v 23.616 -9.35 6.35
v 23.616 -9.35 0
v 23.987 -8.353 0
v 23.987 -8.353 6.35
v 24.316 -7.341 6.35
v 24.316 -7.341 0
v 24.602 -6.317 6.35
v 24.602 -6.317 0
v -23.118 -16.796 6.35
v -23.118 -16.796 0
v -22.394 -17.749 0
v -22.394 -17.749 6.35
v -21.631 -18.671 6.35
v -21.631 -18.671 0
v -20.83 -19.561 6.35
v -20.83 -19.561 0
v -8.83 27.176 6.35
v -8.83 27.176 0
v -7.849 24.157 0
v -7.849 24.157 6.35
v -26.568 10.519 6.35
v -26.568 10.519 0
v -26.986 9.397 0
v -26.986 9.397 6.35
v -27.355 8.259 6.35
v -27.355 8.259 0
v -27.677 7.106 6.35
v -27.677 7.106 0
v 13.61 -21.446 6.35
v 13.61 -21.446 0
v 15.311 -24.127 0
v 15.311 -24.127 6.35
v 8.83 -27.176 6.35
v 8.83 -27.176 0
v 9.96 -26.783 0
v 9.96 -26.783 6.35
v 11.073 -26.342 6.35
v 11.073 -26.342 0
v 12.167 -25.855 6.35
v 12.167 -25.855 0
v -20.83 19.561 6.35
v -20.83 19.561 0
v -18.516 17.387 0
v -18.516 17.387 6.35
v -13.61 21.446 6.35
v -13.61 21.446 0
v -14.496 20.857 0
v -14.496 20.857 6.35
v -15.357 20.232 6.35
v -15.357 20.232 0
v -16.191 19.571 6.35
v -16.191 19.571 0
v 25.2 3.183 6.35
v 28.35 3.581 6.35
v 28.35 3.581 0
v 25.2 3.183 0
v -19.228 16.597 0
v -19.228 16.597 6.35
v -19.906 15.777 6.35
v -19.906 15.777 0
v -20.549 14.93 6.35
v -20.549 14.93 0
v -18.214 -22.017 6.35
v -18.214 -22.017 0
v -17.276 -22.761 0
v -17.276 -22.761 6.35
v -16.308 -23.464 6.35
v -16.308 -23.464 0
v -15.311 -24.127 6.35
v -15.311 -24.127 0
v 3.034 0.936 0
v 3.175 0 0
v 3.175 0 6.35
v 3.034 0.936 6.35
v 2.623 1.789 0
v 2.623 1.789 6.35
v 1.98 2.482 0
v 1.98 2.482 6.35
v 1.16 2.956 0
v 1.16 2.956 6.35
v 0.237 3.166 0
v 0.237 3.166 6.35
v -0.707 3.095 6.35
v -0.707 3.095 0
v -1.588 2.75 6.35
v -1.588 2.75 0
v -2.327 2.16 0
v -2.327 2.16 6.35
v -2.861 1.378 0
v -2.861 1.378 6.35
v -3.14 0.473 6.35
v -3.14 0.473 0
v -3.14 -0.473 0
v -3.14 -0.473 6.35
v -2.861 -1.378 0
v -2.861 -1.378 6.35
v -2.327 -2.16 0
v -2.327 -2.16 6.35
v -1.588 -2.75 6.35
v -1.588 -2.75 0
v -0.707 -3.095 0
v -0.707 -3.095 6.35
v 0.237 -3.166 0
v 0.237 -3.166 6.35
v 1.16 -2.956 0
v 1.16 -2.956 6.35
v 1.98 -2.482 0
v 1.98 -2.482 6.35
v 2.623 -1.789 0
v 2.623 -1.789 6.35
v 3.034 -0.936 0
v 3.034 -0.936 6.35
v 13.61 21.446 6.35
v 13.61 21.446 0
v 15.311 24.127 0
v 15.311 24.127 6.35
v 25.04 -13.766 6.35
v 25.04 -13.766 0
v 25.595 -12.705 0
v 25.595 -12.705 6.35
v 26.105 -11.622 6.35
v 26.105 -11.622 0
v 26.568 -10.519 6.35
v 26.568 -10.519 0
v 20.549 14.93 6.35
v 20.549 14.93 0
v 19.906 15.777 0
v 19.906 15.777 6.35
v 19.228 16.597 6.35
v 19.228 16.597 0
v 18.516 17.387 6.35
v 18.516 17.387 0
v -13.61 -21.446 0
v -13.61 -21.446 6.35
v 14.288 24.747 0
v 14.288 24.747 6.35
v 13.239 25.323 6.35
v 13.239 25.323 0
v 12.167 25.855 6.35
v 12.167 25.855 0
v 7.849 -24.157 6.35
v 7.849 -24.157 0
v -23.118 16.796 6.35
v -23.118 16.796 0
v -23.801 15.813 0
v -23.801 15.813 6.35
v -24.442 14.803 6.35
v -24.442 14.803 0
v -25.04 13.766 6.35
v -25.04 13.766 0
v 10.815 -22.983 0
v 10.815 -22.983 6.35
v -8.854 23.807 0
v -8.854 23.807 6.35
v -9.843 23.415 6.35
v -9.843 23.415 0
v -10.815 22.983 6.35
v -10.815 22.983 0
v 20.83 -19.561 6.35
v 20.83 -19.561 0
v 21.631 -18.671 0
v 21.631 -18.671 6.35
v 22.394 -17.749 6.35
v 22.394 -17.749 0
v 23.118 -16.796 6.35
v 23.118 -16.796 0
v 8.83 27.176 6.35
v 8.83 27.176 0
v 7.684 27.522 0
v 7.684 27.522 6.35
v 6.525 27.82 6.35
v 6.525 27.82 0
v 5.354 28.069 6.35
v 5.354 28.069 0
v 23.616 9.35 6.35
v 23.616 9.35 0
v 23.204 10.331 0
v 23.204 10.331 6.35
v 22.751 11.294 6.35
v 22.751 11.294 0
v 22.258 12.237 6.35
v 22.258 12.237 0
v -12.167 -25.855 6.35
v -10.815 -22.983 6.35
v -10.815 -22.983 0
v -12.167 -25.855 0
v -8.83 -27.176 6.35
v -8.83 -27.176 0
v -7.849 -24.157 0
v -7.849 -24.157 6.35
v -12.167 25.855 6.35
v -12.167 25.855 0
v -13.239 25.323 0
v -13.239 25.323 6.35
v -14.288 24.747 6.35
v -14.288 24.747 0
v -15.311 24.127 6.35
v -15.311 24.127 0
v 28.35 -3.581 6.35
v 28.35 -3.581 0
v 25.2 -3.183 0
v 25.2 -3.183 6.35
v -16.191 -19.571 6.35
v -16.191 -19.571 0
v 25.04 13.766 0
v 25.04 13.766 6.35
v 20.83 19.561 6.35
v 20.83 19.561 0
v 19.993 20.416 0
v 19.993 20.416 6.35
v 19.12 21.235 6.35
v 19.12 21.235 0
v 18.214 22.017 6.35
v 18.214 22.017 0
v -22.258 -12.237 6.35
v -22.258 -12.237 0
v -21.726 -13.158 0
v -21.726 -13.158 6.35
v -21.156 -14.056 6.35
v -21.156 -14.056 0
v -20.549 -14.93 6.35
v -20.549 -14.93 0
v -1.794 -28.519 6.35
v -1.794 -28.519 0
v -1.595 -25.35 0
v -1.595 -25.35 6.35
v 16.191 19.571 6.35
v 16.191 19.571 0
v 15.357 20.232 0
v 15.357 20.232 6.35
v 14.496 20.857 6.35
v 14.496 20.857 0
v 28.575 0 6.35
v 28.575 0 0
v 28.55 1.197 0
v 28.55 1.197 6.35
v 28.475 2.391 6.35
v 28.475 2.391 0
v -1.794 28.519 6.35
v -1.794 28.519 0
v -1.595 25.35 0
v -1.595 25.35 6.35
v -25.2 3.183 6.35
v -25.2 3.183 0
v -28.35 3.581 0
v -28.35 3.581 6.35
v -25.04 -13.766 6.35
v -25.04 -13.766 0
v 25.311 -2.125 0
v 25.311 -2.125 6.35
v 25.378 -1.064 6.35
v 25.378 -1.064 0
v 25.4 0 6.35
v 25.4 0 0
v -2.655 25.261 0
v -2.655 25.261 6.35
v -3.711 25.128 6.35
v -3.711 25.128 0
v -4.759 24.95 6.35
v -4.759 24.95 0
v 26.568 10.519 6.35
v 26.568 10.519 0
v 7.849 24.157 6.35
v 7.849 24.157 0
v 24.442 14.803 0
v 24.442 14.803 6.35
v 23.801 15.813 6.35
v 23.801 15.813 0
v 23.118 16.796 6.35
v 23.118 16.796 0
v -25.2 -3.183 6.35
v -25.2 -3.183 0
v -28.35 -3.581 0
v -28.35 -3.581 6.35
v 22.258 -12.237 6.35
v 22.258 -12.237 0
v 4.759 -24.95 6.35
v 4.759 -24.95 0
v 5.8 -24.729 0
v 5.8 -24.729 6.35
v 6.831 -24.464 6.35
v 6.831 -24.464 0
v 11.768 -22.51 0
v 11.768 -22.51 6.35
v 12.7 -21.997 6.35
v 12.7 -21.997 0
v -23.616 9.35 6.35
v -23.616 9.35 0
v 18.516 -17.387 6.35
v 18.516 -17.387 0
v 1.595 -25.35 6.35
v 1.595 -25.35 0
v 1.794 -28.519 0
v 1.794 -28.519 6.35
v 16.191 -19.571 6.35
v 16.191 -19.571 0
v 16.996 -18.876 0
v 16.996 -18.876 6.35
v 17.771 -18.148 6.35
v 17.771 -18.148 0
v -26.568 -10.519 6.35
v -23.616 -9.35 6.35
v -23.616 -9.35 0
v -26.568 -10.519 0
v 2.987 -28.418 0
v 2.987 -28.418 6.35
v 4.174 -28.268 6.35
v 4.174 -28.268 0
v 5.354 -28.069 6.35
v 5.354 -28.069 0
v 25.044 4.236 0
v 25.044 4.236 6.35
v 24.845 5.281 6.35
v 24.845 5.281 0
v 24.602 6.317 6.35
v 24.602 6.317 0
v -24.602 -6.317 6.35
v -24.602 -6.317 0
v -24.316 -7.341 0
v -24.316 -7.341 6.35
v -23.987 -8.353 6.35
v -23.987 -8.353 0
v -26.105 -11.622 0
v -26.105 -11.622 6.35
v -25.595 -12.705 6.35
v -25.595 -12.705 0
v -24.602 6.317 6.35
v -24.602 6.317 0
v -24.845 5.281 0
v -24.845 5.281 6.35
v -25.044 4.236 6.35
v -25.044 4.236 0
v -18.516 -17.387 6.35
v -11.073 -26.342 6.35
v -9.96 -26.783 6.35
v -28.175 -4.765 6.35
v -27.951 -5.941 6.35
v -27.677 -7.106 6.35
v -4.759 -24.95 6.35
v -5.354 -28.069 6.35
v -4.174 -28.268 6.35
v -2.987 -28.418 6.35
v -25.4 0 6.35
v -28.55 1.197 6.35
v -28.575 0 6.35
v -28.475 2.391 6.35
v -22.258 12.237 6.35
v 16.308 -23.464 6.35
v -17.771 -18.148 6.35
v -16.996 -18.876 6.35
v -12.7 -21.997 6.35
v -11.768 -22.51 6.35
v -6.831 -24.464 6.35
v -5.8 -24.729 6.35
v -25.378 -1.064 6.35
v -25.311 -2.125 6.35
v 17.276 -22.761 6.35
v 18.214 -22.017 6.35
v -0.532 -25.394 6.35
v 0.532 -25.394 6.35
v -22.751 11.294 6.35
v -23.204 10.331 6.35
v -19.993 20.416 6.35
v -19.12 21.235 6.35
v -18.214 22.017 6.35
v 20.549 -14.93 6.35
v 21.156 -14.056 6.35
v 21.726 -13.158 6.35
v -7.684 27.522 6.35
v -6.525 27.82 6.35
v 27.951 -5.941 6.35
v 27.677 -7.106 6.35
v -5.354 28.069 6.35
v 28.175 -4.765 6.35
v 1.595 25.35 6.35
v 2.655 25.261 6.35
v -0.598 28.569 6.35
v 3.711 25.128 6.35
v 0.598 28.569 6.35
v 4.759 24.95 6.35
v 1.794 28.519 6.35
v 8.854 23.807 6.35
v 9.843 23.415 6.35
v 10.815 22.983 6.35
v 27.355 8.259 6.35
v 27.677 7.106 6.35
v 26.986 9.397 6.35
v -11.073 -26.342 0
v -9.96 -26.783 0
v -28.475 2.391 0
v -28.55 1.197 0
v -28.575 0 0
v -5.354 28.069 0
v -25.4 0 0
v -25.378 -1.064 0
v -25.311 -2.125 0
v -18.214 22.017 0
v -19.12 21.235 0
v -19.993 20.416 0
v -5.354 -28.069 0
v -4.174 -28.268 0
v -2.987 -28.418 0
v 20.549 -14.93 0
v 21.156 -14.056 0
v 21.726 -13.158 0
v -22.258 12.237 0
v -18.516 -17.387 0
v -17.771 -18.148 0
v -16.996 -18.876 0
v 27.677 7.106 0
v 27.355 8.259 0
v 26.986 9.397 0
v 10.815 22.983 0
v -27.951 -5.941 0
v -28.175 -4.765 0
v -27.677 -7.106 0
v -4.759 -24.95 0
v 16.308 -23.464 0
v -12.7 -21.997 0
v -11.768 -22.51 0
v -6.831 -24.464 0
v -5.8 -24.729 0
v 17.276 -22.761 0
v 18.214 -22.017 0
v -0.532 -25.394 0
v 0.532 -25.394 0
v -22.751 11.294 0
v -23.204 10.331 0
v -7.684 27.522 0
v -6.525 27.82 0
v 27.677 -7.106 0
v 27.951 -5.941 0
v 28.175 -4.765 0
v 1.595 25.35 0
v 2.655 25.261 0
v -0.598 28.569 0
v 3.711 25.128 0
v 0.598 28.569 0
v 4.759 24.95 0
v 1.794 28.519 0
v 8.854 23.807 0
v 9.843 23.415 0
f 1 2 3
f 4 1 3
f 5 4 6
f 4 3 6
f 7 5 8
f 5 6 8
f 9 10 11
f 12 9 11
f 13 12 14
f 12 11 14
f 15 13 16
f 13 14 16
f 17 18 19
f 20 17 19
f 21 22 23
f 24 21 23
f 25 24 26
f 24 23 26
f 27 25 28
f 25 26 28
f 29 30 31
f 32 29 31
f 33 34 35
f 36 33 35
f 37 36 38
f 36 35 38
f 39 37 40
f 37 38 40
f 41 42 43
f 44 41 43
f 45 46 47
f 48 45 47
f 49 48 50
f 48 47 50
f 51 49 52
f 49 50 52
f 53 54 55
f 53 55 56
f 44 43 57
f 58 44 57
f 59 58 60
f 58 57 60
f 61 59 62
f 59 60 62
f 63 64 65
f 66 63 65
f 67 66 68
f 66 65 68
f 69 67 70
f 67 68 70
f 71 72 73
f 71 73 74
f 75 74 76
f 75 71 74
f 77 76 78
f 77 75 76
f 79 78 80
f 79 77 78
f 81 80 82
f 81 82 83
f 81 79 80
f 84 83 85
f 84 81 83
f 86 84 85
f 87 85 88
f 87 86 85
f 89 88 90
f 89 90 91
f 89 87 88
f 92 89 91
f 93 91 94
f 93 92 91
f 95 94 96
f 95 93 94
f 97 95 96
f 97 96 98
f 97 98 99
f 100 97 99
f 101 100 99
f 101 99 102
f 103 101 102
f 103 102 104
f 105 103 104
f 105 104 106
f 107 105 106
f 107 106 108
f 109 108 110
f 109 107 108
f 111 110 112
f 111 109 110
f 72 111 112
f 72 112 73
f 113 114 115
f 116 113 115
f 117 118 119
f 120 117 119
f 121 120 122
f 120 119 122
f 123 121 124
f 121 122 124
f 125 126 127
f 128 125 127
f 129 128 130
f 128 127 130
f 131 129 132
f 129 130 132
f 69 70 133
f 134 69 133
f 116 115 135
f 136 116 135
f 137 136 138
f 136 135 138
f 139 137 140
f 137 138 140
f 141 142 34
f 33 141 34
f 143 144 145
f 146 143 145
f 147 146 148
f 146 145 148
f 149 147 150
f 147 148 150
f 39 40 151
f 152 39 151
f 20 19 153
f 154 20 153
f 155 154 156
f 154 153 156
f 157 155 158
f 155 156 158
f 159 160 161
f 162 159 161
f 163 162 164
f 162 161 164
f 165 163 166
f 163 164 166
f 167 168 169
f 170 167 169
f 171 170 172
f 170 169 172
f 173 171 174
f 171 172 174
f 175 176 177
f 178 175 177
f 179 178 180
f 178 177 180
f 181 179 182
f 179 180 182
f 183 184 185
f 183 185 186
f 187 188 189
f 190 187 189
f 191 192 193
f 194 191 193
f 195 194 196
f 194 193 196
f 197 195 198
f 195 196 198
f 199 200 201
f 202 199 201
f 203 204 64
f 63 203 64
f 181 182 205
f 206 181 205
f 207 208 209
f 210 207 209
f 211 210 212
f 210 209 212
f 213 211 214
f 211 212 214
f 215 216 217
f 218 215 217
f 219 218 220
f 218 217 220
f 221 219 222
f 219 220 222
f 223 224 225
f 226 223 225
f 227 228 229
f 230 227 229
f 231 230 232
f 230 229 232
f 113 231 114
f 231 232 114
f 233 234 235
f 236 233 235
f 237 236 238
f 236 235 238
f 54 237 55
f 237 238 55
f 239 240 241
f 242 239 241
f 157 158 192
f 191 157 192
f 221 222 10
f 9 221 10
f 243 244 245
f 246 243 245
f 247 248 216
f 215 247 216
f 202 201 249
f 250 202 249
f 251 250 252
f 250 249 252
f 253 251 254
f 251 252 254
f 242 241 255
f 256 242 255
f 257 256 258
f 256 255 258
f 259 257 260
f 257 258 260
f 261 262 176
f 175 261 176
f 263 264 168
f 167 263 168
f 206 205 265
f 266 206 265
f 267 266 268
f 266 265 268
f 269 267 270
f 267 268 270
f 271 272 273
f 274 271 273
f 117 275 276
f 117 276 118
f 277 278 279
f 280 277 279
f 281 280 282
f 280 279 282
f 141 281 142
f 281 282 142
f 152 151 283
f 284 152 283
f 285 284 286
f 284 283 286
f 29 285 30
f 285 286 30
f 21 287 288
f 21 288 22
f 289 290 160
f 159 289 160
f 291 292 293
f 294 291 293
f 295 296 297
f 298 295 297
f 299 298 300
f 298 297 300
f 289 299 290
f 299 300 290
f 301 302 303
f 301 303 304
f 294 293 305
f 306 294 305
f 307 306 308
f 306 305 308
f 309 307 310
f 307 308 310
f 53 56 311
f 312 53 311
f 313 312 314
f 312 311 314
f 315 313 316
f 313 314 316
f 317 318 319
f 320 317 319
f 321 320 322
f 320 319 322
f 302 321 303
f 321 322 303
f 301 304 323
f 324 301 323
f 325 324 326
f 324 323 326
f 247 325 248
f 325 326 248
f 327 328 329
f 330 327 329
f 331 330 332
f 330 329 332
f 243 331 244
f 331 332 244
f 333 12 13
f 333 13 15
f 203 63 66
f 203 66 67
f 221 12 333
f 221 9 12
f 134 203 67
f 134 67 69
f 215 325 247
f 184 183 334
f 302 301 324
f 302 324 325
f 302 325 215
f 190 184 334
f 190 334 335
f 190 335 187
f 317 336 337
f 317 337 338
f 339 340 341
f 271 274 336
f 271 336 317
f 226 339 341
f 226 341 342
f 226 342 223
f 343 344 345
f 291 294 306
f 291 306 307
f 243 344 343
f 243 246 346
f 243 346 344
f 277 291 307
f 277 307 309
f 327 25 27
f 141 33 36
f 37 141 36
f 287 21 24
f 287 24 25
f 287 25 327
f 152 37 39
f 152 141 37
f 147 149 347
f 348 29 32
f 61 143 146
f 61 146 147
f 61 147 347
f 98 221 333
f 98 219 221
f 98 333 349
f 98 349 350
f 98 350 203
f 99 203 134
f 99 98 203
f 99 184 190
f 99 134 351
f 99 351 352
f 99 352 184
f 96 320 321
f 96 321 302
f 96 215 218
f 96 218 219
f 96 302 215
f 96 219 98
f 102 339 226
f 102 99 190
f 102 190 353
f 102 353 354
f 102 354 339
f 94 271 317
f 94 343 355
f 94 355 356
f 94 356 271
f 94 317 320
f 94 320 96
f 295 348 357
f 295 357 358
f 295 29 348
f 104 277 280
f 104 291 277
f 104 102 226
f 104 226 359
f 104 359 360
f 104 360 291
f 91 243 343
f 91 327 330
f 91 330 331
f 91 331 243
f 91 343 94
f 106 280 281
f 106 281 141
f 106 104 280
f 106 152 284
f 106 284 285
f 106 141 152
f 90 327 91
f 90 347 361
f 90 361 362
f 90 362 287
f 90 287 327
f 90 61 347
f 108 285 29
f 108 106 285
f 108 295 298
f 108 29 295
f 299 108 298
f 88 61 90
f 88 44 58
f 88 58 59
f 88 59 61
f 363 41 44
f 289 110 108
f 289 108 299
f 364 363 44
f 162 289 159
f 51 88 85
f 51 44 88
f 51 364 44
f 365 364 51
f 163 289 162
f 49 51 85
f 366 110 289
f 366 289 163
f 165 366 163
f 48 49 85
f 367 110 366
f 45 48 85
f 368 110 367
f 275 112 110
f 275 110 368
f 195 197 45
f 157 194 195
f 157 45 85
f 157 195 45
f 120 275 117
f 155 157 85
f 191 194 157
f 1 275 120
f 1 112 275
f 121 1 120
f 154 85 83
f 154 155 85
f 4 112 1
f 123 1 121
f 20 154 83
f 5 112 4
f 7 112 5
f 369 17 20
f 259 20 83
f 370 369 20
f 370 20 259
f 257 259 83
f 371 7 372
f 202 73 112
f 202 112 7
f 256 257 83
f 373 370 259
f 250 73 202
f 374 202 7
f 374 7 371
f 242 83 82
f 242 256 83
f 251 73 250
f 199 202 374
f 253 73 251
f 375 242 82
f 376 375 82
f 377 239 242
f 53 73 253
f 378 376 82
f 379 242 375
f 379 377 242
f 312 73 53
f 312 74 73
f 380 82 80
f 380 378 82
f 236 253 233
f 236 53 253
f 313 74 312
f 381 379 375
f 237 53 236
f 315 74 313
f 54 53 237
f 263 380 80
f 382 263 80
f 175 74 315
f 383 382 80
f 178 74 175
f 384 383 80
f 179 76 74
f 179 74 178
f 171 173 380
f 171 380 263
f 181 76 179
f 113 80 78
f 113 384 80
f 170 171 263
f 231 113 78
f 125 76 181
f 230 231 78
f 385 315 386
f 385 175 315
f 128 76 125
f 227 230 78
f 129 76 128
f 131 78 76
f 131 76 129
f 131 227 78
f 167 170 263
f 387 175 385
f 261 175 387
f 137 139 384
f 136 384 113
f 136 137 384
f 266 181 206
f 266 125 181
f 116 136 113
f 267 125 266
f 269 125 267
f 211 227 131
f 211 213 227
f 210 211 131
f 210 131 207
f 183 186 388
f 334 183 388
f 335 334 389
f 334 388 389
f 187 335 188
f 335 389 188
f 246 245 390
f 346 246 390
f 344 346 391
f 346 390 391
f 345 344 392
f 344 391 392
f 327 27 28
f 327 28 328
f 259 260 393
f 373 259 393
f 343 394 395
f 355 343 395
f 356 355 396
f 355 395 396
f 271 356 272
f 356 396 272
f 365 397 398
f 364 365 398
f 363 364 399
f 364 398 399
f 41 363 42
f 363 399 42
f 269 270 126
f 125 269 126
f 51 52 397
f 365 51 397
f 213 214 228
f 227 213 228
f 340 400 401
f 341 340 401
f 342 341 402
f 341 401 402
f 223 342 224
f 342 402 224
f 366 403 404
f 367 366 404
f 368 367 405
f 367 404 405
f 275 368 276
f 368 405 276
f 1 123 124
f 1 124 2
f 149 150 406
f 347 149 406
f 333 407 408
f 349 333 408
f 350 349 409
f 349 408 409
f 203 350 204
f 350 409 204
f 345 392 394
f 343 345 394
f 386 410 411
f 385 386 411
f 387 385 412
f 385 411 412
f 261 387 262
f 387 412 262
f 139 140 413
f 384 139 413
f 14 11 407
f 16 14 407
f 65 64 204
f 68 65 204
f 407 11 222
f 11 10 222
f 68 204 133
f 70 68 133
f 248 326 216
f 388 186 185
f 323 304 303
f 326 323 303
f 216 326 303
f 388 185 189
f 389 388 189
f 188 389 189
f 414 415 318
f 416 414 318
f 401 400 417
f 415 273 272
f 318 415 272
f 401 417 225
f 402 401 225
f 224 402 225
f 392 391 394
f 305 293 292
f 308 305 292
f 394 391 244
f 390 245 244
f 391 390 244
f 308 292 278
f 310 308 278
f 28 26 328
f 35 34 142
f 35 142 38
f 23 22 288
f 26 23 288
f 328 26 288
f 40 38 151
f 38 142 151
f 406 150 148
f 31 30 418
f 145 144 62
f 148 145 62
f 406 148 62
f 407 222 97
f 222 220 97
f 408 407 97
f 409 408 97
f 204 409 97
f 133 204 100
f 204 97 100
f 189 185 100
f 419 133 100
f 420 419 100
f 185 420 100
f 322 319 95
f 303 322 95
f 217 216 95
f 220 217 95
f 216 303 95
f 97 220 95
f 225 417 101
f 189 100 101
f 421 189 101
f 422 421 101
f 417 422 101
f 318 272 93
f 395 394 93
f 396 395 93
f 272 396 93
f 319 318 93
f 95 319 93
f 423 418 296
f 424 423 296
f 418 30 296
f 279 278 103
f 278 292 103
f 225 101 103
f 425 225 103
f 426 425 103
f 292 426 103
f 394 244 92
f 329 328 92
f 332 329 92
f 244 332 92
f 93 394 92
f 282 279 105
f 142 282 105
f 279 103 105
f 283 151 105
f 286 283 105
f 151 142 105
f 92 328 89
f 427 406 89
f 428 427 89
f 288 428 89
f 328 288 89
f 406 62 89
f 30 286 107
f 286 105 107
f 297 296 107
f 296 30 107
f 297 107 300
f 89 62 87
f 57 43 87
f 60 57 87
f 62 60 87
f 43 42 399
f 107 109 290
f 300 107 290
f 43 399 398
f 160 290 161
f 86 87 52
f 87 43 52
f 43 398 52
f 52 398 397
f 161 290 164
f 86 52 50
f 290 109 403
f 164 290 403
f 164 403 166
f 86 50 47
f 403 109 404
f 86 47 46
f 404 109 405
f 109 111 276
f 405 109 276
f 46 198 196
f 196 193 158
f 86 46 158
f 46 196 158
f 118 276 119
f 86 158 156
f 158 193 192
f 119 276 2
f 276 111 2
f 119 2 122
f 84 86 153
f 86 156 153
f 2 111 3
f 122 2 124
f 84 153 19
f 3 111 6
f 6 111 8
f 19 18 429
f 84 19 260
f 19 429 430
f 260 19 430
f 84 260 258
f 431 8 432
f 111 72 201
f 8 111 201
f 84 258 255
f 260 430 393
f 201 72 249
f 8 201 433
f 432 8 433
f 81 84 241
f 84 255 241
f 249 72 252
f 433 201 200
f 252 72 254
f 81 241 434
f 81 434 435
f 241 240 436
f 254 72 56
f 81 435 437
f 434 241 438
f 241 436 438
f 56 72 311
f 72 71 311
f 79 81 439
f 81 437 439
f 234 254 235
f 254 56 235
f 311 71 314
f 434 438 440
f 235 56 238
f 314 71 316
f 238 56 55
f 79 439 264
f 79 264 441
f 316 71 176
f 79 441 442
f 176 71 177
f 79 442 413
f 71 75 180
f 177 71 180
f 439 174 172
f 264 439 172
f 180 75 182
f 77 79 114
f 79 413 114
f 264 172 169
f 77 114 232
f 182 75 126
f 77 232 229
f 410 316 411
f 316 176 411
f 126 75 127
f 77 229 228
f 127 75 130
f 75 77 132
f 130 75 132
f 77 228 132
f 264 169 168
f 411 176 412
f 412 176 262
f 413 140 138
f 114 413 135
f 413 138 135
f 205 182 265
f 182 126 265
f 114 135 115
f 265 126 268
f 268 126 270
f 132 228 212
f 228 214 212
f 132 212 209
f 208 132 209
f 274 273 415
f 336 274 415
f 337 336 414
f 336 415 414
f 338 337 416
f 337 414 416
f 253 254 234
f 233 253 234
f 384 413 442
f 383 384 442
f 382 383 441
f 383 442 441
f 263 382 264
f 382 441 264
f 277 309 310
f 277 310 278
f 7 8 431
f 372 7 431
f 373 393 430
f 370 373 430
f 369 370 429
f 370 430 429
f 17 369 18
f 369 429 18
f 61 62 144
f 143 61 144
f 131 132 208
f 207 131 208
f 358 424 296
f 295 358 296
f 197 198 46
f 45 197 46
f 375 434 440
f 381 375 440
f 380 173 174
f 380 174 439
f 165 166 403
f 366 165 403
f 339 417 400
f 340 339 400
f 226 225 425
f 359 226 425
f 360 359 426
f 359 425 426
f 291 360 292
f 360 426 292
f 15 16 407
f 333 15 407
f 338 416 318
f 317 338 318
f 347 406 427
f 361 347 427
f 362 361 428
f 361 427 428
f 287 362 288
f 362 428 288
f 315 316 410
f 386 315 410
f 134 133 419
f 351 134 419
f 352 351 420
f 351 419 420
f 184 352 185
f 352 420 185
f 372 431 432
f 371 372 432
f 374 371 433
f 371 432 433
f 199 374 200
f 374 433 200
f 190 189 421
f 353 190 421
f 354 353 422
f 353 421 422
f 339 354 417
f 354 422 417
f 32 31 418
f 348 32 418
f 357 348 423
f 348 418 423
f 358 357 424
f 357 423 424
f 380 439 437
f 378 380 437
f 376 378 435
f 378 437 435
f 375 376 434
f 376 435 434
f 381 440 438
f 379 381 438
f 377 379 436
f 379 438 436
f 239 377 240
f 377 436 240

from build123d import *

# Parameters (mm, degrees)
F0_R     = 3.175
F1_DEPTH = 6.35


with BuildPart() as f1:
    # F0 (on Top) → F1 (new body)
    with BuildSketch(Plane.XY):
        with BuildLine():
            Line((-4.759485, 24.950096), (-5.354421, 28.068858))
            ThreePointArc((-5.354421, 28.068858), (-7.106314, 27.677264), (-8.830161, 27.17644))
            Line((-8.830161, 27.17644), (-7.849032, 24.156836))
            ThreePointArc((-7.849032, 24.156836), (-9.350364, 23.616323), (-10.814794, 22.982607))
            Line((-10.814794, 22.982607), (-12.166643, 25.855433))
            ThreePointArc((-12.166643, 25.855433), (-13.766111, 25.040463), (-15.311251, 24.12667))
            Line((-15.311251, 24.12667), (-13.610001, 21.445929))
            ThreePointArc((-13.610001, 21.445929), (-14.929745, 20.549032), (-16.190569, 19.571036))
            Line((-16.190569, 19.571036), (-18.214391, 22.017416))
            ThreePointArc((-18.214391, 22.017416), (-19.560934, 20.830279), (-20.830279, 19.560934))
            Line((-20.830279, 19.560934), (-18.515803, 17.387496))
            ThreePointArc((-18.515803, 17.387496), (-19.571036, 16.190569), (-20.549032, 14.929745))
            Line((-20.549032, 14.929745), (-23.117661, 16.795964))
            ThreePointArc((-23.117661, 16.795964), (-24.12667, 15.311251), (-25.040463, 13.766111))
            Line((-25.040463, 13.766111), (-22.25819, 12.236543))
            ThreePointArc((-22.25819, 12.236543), (-22.982607, 10.814794), (-23.616323, 9.350364))
            Line((-23.616323, 9.350364), (-26.568363, 10.519159))
            ThreePointArc((-26.568363, 10.519159), (-27.17644, 8.830161), (-27.677264, 7.106314))
            Line((-27.677264, 7.106314), (-24.602012, 6.316723))
            ThreePointArc((-24.602012, 6.316723), (-24.950096, 4.759485), (-25.199713, 3.183464))
            Line((-25.199713, 3.183464), (-28.349678, 3.581397))
            ThreePointArc((-28.349678, 3.581397), (-28.518614, 1.794239), (-28.575, 0))
            Line((-28.575, 0), (-25.4, 0))
            ThreePointArc((-25.4, 0), (-25.349879, -1.594879), (-25.199713, -3.183464))
            Line((-25.199713, -3.183464), (-28.349678, -3.581397))
            ThreePointArc((-28.349678, -3.581397), (-28.068858, -5.354421), (-27.677264, -7.106314))
            Line((-27.677264, -7.106314), (-24.602012, -6.316723))
            ThreePointArc((-24.602012, -6.316723), (-24.156836, -7.849032), (-23.616323, -9.350364))
            Line((-23.616323, -9.350364), (-26.568363, -10.519159))
            ThreePointArc((-26.568363, -10.519159), (-25.855433, -12.166643), (-25.040463, -13.766111))
            Line((-25.040463, -13.766111), (-22.25819, -12.236543))
            ThreePointArc((-22.25819, -12.236543), (-21.445929, -13.610001), (-20.549032, -14.929745))
            Line((-20.549032, -14.929745), (-23.117661, -16.795964))
            ThreePointArc((-23.117661, -16.795964), (-22.017416, -18.214391), (-20.830279, -19.560934))
            Line((-20.830279, -19.560934), (-18.515803, -17.387496))
            ThreePointArc((-18.515803, -17.387496), (-17.387496, -18.515803), (-16.190569, -19.571036))
            Line((-16.190569, -19.571036), (-18.214391, -22.017416))
            ThreePointArc((-18.214391, -22.017416), (-16.795964, -23.117661), (-15.311251, -24.12667))
            Line((-15.311251, -24.12667), (-13.610001, -21.445929))
            ThreePointArc((-13.610001, -21.445929), (-12.236543, -22.25819), (-10.814794, -22.982607))
            Line((-10.814794, -22.982607), (-12.166643, -25.855433))
            ThreePointArc((-12.166643, -25.855433), (-10.519159, -26.568363), (-8.830161, -27.17644))
            Line((-8.830161, -27.17644), (-7.849032, -24.156836))
            ThreePointArc((-7.849032, -24.156836), (-6.316723, -24.602012), (-4.759485, -24.950096))
            Line((-4.759485, -24.950096), (-5.354421, -28.068858))
            ThreePointArc((-5.354421, -28.068858), (-3.581397, -28.349678), (-1.794239, -28.518614))
            Line((-1.794239, -28.518614), (-1.594879, -25.349879))
            ThreePointArc((-1.594879, -25.349879), (0, -25.4), (1.594879, -25.349879))
            Line((1.594879, -25.349879), (1.794239, -28.518614))
            ThreePointArc((1.794239, -28.518614), (3.581397, -28.349678), (5.354421, -28.068858))
            Line((5.354421, -28.068858), (4.759485, -24.950096))
            ThreePointArc((4.759485, -24.950096), (6.316723, -24.602012), (7.849032, -24.156836))
            Line((7.849032, -24.156836), (8.830161, -27.17644))
            ThreePointArc((8.830161, -27.17644), (10.519159, -26.568363), (12.166643, -25.855433))
            Line((12.166643, -25.855433), (10.814794, -22.982607))
            ThreePointArc((10.814794, -22.982607), (12.236543, -22.25819), (13.610001, -21.445929))
            Line((13.610001, -21.445929), (15.311251, -24.12667))
            ThreePointArc((15.311251, -24.12667), (16.795964, -23.117661), (18.214391, -22.017416))
            Line((18.214391, -22.017416), (16.190569, -19.571036))
            ThreePointArc((16.190569, -19.571036), (17.387496, -18.515803), (18.515803, -17.387496))
            Line((18.515803, -17.387496), (20.830279, -19.560934))
            ThreePointArc((20.830279, -19.560934), (22.017416, -18.214391), (23.117661, -16.795964))
            Line((23.117661, -16.795964), (20.549032, -14.929745))
            ThreePointArc((20.549032, -14.929745), (21.445929, -13.610001), (22.25819, -12.236543))
            Line((22.25819, -12.236543), (25.040463, -13.766111))
            ThreePointArc((25.040463, -13.766111), (25.855433, -12.166643), (26.568363, -10.519159))
            Line((26.568363, -10.519159), (23.616323, -9.350364))
            ThreePointArc((23.616323, -9.350364), (24.156836, -7.849032), (24.602012, -6.316723))
            Line((24.602012, -6.316723), (27.677264, -7.106314))
            ThreePointArc((27.677264, -7.106314), (28.068858, -5.354421), (28.349678, -3.581397))
            Line((28.349678, -3.581397), (25.199713, -3.183464))
            ThreePointArc((25.199713, -3.183464), (25.349879, -1.594879), (25.4, 0))
            Line((25.4, 0), (28.575, 0))
            ThreePointArc((28.575, 0), (28.518614, 1.794239), (28.349678, 3.581397))
            Line((28.349678, 3.581397), (25.199713, 3.183464))
            ThreePointArc((25.199713, 3.183464), (24.950096, 4.759485), (24.602012, 6.316723))
            Line((24.602012, 6.316723), (27.677264, 7.106314))
            ThreePointArc((27.677264, 7.106314), (27.17644, 8.830161), (26.568363, 10.519159))
            Line((26.568363, 10.519159), (23.616323, 9.350364))
            ThreePointArc((23.616323, 9.350364), (22.982607, 10.814794), (22.25819, 12.236543))
            Line((22.25819, 12.236543), (25.040463, 13.766111))
            ThreePointArc((25.040463, 13.766111), (24.12667, 15.311251), (23.117661, 16.795964))
            Line((23.117661, 16.795964), (20.549032, 14.929745))
            ThreePointArc((20.549032, 14.929745), (19.571036, 16.190569), (18.515803, 17.387496))
            Line((18.515803, 17.387496), (20.830279, 19.560934))
            ThreePointArc((20.830279, 19.560934), (19.560934, 20.830279), (18.214391, 22.017416))
            Line((18.214391, 22.017416), (16.190569, 19.571036))
            ThreePointArc((16.190569, 19.571036), (14.929745, 20.549032), (13.610001, 21.445929))
            Line((13.610001, 21.445929), (15.311251, 24.12667))
            ThreePointArc((15.311251, 24.12667), (13.766111, 25.040463), (12.166643, 25.855433))
            Line((12.166643, 25.855433), (10.814794, 22.982607))
            ThreePointArc((10.814794, 22.982607), (9.350364, 23.616323), (7.849032, 24.156836))
            Line((7.849032, 24.156836), (8.830161, 27.17644))
            ThreePointArc((8.830161, 27.17644), (7.106314, 27.677264), (5.354421, 28.068858))
            Line((5.354421, 28.068858), (4.759485, 24.950096))
            ThreePointArc((4.759485, 24.950096), (3.183464, 25.199713), (1.594879, 25.349879))
            Line((1.594879, 25.349879), (1.794239, 28.518614))
            ThreePointArc((1.794239, 28.518614), (0, 28.575), (-1.794239, 28.518614))
            Line((-1.794239, 28.518614), (-1.594879, 25.349879))
            ThreePointArc((-1.594879, 25.349879), (-3.183464, 25.199713), (-4.759485, 24.950096))
        make_face()
        Circle(F0_R, mode=Mode.SUBTRACT)
    extrude(amount=F1_DEPTH)


solid = f1.part
